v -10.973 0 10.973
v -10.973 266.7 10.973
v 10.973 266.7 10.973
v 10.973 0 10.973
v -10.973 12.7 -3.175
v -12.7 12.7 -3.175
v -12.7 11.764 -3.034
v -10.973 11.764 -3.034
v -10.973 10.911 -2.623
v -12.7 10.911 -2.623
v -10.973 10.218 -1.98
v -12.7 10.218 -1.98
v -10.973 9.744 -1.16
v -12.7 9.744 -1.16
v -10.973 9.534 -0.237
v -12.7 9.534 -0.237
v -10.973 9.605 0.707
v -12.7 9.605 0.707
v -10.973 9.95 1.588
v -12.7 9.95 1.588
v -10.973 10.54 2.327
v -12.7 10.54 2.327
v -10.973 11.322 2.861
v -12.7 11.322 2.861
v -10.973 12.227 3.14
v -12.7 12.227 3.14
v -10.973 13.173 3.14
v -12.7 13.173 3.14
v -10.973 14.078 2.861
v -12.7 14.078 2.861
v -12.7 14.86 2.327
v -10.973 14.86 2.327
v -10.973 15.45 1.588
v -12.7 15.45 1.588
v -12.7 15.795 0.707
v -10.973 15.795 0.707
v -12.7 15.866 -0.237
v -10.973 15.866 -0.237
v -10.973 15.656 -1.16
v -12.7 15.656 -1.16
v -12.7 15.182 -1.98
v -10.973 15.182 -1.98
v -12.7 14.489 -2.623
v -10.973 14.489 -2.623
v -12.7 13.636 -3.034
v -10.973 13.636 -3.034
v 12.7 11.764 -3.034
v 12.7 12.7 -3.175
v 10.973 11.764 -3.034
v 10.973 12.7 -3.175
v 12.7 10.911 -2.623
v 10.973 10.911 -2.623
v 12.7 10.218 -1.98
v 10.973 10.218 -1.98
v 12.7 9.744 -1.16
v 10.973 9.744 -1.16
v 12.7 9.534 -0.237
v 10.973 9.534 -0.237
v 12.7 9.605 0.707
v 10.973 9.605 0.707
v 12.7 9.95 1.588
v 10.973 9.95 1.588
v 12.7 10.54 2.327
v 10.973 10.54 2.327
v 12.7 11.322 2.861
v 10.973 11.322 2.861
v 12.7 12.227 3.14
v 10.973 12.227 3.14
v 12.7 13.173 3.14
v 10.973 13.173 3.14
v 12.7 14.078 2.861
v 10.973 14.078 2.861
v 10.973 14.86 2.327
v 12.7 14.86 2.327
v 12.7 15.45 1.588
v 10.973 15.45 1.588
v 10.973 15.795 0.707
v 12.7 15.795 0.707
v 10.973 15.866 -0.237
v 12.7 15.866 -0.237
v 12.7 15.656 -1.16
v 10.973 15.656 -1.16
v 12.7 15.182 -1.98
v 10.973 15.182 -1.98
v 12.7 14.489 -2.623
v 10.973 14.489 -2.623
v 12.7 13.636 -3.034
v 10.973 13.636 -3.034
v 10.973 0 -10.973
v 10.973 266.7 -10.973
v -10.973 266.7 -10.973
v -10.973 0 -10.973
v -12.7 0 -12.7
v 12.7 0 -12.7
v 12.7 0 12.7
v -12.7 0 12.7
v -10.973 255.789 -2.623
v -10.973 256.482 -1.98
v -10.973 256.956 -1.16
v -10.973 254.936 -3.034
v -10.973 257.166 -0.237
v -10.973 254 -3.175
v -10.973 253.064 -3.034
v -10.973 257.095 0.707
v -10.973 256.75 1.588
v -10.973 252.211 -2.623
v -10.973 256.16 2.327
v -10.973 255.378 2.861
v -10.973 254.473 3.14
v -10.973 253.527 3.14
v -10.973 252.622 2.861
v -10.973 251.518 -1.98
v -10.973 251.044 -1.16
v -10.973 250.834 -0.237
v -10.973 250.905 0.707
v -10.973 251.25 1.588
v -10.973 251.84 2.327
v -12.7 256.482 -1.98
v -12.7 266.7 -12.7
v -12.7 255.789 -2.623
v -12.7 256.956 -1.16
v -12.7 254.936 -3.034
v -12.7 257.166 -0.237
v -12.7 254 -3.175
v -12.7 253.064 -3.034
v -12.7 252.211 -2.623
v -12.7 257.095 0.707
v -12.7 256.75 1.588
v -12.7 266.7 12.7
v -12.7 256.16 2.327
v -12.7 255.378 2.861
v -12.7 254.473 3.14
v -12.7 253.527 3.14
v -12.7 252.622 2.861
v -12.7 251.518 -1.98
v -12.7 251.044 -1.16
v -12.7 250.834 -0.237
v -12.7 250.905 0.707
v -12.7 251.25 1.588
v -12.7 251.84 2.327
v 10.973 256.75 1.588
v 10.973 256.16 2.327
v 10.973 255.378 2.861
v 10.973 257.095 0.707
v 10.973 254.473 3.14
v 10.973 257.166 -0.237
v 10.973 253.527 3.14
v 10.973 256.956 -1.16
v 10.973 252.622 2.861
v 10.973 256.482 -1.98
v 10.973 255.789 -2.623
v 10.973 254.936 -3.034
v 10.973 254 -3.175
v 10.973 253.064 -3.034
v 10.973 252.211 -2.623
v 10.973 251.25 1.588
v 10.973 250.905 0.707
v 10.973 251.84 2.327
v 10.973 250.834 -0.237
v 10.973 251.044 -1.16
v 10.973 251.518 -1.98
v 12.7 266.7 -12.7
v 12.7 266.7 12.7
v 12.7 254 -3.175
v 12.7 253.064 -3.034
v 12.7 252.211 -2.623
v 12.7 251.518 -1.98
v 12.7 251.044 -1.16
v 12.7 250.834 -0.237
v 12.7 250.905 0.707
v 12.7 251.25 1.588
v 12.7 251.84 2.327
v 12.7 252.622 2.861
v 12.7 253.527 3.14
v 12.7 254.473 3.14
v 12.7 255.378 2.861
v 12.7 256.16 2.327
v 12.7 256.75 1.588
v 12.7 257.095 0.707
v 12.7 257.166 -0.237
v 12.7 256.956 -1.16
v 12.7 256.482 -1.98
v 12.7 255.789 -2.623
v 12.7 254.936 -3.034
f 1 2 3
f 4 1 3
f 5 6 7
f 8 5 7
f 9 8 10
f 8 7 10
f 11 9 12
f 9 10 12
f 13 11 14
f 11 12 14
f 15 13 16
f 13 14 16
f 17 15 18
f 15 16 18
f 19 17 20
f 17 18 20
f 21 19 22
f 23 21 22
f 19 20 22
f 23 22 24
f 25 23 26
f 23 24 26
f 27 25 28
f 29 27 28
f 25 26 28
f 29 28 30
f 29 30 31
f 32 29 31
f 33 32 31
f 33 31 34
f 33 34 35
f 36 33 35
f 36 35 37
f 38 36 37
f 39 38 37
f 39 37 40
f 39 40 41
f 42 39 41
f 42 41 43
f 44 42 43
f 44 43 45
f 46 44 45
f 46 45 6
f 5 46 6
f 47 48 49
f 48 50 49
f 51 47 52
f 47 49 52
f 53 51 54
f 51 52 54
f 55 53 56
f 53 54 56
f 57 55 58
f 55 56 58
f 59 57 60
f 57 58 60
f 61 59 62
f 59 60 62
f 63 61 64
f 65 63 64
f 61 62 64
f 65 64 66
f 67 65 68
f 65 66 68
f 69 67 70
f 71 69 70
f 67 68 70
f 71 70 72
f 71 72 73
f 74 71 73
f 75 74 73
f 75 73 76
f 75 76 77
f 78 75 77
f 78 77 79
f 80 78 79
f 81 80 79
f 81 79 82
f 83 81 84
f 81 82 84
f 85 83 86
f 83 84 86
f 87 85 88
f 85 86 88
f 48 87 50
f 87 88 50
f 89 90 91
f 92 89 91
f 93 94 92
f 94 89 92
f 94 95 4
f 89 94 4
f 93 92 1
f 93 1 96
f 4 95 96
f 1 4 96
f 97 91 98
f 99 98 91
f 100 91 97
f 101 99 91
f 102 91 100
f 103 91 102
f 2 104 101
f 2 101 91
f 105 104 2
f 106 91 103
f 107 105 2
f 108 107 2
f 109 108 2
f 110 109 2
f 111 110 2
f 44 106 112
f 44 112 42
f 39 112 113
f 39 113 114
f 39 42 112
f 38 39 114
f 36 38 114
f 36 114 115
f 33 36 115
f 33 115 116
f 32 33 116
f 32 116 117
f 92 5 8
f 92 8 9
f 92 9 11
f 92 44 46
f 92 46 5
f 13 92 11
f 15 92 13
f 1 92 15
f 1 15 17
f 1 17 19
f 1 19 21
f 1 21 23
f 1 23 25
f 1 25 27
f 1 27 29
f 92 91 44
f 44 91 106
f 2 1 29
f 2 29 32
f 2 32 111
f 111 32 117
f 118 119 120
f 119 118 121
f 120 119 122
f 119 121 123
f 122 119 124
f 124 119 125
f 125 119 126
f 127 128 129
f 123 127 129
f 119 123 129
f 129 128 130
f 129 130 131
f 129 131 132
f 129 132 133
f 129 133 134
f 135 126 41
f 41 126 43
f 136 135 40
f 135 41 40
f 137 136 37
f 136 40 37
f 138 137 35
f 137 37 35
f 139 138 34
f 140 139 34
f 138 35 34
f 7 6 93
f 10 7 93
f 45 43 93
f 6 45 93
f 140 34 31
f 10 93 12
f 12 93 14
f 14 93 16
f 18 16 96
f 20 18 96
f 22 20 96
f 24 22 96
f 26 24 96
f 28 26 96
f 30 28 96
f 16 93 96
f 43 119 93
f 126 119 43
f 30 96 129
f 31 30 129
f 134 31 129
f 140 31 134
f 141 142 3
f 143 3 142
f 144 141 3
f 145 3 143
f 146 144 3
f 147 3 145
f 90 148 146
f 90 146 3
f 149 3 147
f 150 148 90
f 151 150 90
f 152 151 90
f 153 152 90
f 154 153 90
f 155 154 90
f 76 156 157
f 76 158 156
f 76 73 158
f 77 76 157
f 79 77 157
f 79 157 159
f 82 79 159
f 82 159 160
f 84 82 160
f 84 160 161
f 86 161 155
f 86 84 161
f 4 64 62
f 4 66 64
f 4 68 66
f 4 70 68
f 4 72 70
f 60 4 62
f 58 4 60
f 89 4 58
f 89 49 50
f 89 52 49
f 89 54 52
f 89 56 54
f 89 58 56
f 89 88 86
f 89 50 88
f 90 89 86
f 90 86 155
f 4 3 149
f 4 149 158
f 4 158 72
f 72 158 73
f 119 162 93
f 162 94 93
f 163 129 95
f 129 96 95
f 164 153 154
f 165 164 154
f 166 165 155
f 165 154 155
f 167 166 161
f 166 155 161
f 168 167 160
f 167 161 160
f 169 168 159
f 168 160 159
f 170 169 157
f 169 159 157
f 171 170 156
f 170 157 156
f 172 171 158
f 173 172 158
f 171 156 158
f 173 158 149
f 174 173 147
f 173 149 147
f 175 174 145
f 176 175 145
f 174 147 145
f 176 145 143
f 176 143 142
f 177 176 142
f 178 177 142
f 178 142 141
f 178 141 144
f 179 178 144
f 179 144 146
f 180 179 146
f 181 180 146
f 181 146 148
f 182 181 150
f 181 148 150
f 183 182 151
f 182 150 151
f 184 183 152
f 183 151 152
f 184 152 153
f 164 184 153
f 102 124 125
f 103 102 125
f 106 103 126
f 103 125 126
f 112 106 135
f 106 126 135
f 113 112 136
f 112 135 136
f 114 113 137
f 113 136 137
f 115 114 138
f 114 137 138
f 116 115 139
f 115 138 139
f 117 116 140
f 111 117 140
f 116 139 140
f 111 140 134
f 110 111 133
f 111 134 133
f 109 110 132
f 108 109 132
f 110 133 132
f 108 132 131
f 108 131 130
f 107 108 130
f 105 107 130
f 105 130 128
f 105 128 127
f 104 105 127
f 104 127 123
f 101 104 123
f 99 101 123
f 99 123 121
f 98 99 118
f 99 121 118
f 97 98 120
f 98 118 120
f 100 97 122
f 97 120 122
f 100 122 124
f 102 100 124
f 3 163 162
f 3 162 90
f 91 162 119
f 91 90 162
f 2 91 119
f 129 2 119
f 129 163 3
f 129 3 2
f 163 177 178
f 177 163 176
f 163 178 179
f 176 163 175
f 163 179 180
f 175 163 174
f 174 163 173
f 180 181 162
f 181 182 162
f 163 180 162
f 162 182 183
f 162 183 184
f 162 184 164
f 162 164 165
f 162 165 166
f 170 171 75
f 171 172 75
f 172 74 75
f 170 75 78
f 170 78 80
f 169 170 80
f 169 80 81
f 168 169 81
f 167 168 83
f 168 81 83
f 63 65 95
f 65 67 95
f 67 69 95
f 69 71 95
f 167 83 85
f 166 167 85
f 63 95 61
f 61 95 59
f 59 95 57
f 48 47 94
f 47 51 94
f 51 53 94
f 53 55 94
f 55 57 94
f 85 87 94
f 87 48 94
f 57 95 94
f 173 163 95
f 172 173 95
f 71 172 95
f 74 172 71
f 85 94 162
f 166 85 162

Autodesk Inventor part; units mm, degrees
ref_plane "YZ Plane" through (0, 0, 0) normal (1, 0, 0) x (0, 1, 0)
ref_plane "XZ Plane" through (0, 0, 0) normal (0, 1, 0) x (-1, 0, 0)
ref_plane "XY Plane" through (0, 0, 0) normal (0, 0, 1) x (1, 0, 0)
sketch "Sketch1" plane through (0, 0, 0) normal (0, 1, 0) x (-1, 0, 0)
  line L0 (12.7, 12.7) -> (-12.7, 12.7)
  line L1 (-12.7, 12.7) -> (-12.7, -12.7)
  line L2 (-12.7, -12.7) -> (12.7, -12.7)
  line L3 (12.7, -12.7) -> (12.7, 12.7)
  line L4 (12.7, 12.7) -> (-12.7, -12.7) construction
  line L5 (-12.7, 12.7) -> (12.7, -12.7) construction
  line L6 (-10.9728, -10.9728) -> (10.9728, -10.9728)
  line L7 (10.9728, -10.9728) -> (10.9728, 10.9728)
  line L8 (10.9728, 10.9728) -> (-10.9728, 10.9728)
  line L9 (-10.9728, 10.9728) -> (-10.9728, -10.9728)
  line L10 (-10.9728, -10.9728) -> (10.9728, 10.9728) construction
  line L11 (10.9728, -10.9728) -> (-10.9728, 10.9728) construction
  point P0 (0, 0)
  dimension "d0" = 25.4
  dimension "d2" = 25.4
  dimension "d3" = 1.7272
extrude "Extrusion1" add sketch "Sketch1" along normal blind 266.7
sketch "Sketch2" plane through (12.7, 0, 12.7) normal (1, 0, 0) x (0, 0, -1)
  line L0 (0, 0) -> (25.4, 0) projected
  line L1 (25.4, 0) -> (25.4, 266.7) projected
  line L2 (0, 266.7) -> (25.4, 266.7) projected
  line L3 (0, 0) -> (0, 266.7) projected
  point P0 (12.7, 0)
  point P1 (12.7, 254)
  point P2 (12.7, 12.7)
  dimension "d6" = 12.7
  dimension "d7" = 12.7
  dimension "d8" = 12.7
  dimension "d9" = 12.7
hole "Hole1" at (12.7, 254, 0) at (12.7, 12.7, 0) direction (-1, 0, 0) diameter 6.35 end through all
properties part number "CrossBar" material "Aluminum 6061"
